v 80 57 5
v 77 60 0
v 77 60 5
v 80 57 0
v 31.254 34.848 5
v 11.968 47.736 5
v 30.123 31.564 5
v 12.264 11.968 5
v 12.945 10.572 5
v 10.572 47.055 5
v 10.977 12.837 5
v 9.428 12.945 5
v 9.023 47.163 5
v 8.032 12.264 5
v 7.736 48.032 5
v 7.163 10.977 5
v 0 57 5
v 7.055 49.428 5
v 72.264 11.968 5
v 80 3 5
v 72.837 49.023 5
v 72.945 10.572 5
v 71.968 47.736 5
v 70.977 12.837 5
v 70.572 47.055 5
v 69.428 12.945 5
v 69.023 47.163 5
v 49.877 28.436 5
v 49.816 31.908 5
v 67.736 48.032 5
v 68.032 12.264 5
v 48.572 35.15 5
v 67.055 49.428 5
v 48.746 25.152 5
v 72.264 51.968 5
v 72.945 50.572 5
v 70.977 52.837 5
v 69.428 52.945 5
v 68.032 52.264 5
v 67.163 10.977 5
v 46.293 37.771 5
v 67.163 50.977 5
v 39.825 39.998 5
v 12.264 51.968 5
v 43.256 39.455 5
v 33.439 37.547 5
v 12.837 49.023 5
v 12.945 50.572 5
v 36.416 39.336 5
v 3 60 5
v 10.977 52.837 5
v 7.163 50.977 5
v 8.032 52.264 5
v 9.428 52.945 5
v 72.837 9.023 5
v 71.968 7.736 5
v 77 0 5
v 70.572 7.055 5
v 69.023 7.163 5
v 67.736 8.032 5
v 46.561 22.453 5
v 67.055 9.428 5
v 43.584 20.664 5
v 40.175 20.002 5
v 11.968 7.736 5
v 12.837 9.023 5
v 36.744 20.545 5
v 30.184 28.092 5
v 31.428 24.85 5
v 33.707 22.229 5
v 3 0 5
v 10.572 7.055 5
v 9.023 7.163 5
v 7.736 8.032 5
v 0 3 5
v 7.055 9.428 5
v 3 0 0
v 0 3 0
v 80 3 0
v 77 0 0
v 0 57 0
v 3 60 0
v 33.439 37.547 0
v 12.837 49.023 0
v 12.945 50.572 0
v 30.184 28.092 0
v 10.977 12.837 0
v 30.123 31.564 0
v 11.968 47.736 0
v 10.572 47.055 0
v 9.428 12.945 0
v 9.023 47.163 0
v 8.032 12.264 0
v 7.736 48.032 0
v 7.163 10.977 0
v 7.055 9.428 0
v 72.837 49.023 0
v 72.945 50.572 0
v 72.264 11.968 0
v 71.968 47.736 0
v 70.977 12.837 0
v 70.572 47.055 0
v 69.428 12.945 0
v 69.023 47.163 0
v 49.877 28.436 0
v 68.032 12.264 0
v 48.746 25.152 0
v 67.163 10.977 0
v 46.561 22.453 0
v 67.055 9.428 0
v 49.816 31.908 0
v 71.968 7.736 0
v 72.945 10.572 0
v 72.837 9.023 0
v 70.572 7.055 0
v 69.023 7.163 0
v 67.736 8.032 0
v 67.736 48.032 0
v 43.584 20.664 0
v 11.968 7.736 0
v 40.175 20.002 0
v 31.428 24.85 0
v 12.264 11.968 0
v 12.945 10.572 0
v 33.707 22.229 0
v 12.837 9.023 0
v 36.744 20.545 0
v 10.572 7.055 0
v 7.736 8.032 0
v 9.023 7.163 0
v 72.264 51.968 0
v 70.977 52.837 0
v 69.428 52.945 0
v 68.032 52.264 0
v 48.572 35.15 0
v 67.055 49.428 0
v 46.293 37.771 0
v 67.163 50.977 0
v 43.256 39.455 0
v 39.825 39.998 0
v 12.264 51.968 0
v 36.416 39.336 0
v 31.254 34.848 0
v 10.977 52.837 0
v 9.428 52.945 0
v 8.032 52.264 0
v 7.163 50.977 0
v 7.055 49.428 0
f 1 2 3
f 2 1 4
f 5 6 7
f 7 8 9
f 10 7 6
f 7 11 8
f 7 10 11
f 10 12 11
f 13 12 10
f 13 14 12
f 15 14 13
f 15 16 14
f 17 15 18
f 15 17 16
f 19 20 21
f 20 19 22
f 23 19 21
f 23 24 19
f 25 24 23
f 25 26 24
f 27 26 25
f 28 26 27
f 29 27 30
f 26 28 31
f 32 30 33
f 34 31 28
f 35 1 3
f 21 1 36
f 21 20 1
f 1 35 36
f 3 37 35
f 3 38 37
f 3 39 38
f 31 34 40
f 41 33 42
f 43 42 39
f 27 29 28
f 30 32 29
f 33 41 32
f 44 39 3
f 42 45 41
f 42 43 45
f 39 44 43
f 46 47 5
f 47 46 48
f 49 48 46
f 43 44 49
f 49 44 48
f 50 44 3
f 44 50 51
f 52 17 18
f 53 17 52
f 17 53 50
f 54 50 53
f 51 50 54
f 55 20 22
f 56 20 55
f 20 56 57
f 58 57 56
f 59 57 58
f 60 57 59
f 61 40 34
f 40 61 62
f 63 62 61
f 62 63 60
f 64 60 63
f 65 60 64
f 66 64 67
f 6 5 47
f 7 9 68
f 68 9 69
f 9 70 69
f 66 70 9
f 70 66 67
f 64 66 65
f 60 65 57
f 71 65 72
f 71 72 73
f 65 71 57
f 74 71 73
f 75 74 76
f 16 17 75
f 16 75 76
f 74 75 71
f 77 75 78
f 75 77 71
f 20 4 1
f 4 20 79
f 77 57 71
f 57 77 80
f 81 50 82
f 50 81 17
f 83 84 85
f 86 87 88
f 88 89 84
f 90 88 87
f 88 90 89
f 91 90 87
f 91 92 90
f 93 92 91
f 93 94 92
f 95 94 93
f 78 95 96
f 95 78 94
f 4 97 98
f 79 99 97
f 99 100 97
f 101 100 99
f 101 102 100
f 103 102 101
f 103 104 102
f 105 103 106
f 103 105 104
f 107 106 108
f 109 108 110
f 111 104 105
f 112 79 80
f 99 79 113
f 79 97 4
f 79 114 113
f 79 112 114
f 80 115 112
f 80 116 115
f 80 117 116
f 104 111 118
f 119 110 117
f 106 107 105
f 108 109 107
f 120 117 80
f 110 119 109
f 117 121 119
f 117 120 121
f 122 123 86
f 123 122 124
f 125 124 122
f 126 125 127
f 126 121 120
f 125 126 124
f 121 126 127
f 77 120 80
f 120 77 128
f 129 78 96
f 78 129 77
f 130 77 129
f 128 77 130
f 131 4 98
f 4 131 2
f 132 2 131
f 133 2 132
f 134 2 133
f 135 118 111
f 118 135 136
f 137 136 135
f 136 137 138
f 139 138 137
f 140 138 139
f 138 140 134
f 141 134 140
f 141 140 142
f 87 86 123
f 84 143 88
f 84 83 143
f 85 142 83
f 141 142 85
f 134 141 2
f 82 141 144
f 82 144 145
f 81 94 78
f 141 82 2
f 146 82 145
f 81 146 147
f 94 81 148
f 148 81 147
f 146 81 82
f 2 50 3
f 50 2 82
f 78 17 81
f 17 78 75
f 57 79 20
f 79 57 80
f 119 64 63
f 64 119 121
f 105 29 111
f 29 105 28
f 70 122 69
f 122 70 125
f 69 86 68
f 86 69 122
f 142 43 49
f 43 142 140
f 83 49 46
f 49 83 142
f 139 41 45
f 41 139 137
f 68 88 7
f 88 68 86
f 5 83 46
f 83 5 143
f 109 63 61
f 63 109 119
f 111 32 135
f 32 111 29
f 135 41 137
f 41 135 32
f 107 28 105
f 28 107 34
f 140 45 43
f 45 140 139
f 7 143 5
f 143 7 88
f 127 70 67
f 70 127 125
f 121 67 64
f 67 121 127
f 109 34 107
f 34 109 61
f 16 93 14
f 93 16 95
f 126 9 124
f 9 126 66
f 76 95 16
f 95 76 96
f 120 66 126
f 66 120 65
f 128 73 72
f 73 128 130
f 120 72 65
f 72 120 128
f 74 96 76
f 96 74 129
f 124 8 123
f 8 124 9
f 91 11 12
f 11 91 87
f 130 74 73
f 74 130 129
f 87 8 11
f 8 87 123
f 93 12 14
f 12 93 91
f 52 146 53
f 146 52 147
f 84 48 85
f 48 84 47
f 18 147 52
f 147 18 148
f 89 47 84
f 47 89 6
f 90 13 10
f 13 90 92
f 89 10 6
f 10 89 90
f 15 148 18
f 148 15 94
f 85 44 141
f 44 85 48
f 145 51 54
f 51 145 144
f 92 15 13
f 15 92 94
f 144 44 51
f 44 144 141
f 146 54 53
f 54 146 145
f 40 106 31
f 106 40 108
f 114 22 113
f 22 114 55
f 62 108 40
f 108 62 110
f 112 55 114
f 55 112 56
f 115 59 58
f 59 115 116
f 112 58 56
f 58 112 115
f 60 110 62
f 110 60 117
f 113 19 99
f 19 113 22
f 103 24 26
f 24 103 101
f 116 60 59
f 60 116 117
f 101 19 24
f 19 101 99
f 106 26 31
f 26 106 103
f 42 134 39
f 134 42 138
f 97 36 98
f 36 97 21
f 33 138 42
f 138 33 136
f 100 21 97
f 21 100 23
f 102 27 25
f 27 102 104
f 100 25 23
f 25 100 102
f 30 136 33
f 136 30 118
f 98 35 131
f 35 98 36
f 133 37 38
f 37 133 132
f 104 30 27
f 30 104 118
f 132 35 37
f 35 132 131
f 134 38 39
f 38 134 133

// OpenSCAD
$fn = 32;

// ----------------------------------------------------------------------
// Spacer plate: rect 80 x 60
// ----------------------------------------------------------------------

// --- parameters (mm) ---
bore_r = 10;              // centre bore radius
bolt_r = 3;               // bolt hole radius
plate_t = 5;              // plate thickness, Z (extrusion height)
plate_l = 80;             // plate length, X
plate_w = 60;             // plate width, Y
inset = 10;               // corner hole inset

profile = [[3, 0], [77, 0], [80, 3], [80, 57], [77, 60], [3, 60], [0, 57], [0, 3]];  // primary outline, 8 points, counter clockwise
void_1 = [[49.816, 31.908], [48.572, 35.15], [46.293, 37.771], [43.256, 39.455], [39.825, 39.998], [36.416, 39.336], [33.439, 37.547], [31.254, 34.848], [30.123, 31.564], [30.184, 28.092], [31.428, 24.85], [33.707, 22.229], [36.744, 20.545], [40.175, 20.002], [43.584, 20.664], [46.561, 22.453], [48.746, 25.152], [49.877, 28.436]];  // centre bore, 18 points
void_2 = [[12.945, 10.572], [12.264, 11.968], [10.977, 12.837], [9.428, 12.945], [8.032, 12.264], [7.163, 10.977], [7.055, 9.428], [7.736, 8.032], [9.023, 7.163], [10.572, 7.055], [11.968, 7.736], [12.837, 9.023]];  // corner hole, 12 points
void_3 = [[12.945, 50.572], [12.264, 51.968], [10.977, 52.837], [9.428, 52.945], [8.032, 52.264], [7.163, 50.977], [7.055, 49.428], [7.736, 48.032], [9.023, 47.163], [10.572, 47.055], [11.968, 47.736], [12.837, 49.023]];  // corner hole, 12 points
void_4 = [[72.945, 10.572], [72.264, 11.968], [70.977, 12.837], [69.428, 12.945], [68.032, 12.264], [67.163, 10.977], [67.055, 9.428], [67.736, 8.032], [69.023, 7.163], [70.572, 7.055], [71.968, 7.736], [72.837, 9.023]];  // corner hole, 12 points
void_5 = [[72.945, 50.572], [72.264, 51.968], [70.977, 52.837], [69.428, 52.945], [68.032, 52.264], [67.163, 50.977], [67.055, 49.428], [67.736, 48.032], [69.023, 47.163], [70.572, 47.055], [71.968, 47.736], [72.837, 49.023]];  // corner hole, 12 points

// --- the one profile operation ---
difference() {
  linear_extrude(height = plate_t) polygon(points = profile);
  translate([0, 0, -1])
    linear_extrude(height = plate_t + 2) polygon(points = void_1);
  translate([0, 0, -1])
    linear_extrude(height = plate_t + 2) polygon(points = void_2);
  translate([0, 0, -1])
    linear_extrude(height = plate_t + 2) polygon(points = void_3);
  translate([0, 0, -1])
    linear_extrude(height = plate_t + 2) polygon(points = void_4);
  translate([0, 0, -1])
    linear_extrude(height = plate_t + 2) polygon(points = void_5);
}
